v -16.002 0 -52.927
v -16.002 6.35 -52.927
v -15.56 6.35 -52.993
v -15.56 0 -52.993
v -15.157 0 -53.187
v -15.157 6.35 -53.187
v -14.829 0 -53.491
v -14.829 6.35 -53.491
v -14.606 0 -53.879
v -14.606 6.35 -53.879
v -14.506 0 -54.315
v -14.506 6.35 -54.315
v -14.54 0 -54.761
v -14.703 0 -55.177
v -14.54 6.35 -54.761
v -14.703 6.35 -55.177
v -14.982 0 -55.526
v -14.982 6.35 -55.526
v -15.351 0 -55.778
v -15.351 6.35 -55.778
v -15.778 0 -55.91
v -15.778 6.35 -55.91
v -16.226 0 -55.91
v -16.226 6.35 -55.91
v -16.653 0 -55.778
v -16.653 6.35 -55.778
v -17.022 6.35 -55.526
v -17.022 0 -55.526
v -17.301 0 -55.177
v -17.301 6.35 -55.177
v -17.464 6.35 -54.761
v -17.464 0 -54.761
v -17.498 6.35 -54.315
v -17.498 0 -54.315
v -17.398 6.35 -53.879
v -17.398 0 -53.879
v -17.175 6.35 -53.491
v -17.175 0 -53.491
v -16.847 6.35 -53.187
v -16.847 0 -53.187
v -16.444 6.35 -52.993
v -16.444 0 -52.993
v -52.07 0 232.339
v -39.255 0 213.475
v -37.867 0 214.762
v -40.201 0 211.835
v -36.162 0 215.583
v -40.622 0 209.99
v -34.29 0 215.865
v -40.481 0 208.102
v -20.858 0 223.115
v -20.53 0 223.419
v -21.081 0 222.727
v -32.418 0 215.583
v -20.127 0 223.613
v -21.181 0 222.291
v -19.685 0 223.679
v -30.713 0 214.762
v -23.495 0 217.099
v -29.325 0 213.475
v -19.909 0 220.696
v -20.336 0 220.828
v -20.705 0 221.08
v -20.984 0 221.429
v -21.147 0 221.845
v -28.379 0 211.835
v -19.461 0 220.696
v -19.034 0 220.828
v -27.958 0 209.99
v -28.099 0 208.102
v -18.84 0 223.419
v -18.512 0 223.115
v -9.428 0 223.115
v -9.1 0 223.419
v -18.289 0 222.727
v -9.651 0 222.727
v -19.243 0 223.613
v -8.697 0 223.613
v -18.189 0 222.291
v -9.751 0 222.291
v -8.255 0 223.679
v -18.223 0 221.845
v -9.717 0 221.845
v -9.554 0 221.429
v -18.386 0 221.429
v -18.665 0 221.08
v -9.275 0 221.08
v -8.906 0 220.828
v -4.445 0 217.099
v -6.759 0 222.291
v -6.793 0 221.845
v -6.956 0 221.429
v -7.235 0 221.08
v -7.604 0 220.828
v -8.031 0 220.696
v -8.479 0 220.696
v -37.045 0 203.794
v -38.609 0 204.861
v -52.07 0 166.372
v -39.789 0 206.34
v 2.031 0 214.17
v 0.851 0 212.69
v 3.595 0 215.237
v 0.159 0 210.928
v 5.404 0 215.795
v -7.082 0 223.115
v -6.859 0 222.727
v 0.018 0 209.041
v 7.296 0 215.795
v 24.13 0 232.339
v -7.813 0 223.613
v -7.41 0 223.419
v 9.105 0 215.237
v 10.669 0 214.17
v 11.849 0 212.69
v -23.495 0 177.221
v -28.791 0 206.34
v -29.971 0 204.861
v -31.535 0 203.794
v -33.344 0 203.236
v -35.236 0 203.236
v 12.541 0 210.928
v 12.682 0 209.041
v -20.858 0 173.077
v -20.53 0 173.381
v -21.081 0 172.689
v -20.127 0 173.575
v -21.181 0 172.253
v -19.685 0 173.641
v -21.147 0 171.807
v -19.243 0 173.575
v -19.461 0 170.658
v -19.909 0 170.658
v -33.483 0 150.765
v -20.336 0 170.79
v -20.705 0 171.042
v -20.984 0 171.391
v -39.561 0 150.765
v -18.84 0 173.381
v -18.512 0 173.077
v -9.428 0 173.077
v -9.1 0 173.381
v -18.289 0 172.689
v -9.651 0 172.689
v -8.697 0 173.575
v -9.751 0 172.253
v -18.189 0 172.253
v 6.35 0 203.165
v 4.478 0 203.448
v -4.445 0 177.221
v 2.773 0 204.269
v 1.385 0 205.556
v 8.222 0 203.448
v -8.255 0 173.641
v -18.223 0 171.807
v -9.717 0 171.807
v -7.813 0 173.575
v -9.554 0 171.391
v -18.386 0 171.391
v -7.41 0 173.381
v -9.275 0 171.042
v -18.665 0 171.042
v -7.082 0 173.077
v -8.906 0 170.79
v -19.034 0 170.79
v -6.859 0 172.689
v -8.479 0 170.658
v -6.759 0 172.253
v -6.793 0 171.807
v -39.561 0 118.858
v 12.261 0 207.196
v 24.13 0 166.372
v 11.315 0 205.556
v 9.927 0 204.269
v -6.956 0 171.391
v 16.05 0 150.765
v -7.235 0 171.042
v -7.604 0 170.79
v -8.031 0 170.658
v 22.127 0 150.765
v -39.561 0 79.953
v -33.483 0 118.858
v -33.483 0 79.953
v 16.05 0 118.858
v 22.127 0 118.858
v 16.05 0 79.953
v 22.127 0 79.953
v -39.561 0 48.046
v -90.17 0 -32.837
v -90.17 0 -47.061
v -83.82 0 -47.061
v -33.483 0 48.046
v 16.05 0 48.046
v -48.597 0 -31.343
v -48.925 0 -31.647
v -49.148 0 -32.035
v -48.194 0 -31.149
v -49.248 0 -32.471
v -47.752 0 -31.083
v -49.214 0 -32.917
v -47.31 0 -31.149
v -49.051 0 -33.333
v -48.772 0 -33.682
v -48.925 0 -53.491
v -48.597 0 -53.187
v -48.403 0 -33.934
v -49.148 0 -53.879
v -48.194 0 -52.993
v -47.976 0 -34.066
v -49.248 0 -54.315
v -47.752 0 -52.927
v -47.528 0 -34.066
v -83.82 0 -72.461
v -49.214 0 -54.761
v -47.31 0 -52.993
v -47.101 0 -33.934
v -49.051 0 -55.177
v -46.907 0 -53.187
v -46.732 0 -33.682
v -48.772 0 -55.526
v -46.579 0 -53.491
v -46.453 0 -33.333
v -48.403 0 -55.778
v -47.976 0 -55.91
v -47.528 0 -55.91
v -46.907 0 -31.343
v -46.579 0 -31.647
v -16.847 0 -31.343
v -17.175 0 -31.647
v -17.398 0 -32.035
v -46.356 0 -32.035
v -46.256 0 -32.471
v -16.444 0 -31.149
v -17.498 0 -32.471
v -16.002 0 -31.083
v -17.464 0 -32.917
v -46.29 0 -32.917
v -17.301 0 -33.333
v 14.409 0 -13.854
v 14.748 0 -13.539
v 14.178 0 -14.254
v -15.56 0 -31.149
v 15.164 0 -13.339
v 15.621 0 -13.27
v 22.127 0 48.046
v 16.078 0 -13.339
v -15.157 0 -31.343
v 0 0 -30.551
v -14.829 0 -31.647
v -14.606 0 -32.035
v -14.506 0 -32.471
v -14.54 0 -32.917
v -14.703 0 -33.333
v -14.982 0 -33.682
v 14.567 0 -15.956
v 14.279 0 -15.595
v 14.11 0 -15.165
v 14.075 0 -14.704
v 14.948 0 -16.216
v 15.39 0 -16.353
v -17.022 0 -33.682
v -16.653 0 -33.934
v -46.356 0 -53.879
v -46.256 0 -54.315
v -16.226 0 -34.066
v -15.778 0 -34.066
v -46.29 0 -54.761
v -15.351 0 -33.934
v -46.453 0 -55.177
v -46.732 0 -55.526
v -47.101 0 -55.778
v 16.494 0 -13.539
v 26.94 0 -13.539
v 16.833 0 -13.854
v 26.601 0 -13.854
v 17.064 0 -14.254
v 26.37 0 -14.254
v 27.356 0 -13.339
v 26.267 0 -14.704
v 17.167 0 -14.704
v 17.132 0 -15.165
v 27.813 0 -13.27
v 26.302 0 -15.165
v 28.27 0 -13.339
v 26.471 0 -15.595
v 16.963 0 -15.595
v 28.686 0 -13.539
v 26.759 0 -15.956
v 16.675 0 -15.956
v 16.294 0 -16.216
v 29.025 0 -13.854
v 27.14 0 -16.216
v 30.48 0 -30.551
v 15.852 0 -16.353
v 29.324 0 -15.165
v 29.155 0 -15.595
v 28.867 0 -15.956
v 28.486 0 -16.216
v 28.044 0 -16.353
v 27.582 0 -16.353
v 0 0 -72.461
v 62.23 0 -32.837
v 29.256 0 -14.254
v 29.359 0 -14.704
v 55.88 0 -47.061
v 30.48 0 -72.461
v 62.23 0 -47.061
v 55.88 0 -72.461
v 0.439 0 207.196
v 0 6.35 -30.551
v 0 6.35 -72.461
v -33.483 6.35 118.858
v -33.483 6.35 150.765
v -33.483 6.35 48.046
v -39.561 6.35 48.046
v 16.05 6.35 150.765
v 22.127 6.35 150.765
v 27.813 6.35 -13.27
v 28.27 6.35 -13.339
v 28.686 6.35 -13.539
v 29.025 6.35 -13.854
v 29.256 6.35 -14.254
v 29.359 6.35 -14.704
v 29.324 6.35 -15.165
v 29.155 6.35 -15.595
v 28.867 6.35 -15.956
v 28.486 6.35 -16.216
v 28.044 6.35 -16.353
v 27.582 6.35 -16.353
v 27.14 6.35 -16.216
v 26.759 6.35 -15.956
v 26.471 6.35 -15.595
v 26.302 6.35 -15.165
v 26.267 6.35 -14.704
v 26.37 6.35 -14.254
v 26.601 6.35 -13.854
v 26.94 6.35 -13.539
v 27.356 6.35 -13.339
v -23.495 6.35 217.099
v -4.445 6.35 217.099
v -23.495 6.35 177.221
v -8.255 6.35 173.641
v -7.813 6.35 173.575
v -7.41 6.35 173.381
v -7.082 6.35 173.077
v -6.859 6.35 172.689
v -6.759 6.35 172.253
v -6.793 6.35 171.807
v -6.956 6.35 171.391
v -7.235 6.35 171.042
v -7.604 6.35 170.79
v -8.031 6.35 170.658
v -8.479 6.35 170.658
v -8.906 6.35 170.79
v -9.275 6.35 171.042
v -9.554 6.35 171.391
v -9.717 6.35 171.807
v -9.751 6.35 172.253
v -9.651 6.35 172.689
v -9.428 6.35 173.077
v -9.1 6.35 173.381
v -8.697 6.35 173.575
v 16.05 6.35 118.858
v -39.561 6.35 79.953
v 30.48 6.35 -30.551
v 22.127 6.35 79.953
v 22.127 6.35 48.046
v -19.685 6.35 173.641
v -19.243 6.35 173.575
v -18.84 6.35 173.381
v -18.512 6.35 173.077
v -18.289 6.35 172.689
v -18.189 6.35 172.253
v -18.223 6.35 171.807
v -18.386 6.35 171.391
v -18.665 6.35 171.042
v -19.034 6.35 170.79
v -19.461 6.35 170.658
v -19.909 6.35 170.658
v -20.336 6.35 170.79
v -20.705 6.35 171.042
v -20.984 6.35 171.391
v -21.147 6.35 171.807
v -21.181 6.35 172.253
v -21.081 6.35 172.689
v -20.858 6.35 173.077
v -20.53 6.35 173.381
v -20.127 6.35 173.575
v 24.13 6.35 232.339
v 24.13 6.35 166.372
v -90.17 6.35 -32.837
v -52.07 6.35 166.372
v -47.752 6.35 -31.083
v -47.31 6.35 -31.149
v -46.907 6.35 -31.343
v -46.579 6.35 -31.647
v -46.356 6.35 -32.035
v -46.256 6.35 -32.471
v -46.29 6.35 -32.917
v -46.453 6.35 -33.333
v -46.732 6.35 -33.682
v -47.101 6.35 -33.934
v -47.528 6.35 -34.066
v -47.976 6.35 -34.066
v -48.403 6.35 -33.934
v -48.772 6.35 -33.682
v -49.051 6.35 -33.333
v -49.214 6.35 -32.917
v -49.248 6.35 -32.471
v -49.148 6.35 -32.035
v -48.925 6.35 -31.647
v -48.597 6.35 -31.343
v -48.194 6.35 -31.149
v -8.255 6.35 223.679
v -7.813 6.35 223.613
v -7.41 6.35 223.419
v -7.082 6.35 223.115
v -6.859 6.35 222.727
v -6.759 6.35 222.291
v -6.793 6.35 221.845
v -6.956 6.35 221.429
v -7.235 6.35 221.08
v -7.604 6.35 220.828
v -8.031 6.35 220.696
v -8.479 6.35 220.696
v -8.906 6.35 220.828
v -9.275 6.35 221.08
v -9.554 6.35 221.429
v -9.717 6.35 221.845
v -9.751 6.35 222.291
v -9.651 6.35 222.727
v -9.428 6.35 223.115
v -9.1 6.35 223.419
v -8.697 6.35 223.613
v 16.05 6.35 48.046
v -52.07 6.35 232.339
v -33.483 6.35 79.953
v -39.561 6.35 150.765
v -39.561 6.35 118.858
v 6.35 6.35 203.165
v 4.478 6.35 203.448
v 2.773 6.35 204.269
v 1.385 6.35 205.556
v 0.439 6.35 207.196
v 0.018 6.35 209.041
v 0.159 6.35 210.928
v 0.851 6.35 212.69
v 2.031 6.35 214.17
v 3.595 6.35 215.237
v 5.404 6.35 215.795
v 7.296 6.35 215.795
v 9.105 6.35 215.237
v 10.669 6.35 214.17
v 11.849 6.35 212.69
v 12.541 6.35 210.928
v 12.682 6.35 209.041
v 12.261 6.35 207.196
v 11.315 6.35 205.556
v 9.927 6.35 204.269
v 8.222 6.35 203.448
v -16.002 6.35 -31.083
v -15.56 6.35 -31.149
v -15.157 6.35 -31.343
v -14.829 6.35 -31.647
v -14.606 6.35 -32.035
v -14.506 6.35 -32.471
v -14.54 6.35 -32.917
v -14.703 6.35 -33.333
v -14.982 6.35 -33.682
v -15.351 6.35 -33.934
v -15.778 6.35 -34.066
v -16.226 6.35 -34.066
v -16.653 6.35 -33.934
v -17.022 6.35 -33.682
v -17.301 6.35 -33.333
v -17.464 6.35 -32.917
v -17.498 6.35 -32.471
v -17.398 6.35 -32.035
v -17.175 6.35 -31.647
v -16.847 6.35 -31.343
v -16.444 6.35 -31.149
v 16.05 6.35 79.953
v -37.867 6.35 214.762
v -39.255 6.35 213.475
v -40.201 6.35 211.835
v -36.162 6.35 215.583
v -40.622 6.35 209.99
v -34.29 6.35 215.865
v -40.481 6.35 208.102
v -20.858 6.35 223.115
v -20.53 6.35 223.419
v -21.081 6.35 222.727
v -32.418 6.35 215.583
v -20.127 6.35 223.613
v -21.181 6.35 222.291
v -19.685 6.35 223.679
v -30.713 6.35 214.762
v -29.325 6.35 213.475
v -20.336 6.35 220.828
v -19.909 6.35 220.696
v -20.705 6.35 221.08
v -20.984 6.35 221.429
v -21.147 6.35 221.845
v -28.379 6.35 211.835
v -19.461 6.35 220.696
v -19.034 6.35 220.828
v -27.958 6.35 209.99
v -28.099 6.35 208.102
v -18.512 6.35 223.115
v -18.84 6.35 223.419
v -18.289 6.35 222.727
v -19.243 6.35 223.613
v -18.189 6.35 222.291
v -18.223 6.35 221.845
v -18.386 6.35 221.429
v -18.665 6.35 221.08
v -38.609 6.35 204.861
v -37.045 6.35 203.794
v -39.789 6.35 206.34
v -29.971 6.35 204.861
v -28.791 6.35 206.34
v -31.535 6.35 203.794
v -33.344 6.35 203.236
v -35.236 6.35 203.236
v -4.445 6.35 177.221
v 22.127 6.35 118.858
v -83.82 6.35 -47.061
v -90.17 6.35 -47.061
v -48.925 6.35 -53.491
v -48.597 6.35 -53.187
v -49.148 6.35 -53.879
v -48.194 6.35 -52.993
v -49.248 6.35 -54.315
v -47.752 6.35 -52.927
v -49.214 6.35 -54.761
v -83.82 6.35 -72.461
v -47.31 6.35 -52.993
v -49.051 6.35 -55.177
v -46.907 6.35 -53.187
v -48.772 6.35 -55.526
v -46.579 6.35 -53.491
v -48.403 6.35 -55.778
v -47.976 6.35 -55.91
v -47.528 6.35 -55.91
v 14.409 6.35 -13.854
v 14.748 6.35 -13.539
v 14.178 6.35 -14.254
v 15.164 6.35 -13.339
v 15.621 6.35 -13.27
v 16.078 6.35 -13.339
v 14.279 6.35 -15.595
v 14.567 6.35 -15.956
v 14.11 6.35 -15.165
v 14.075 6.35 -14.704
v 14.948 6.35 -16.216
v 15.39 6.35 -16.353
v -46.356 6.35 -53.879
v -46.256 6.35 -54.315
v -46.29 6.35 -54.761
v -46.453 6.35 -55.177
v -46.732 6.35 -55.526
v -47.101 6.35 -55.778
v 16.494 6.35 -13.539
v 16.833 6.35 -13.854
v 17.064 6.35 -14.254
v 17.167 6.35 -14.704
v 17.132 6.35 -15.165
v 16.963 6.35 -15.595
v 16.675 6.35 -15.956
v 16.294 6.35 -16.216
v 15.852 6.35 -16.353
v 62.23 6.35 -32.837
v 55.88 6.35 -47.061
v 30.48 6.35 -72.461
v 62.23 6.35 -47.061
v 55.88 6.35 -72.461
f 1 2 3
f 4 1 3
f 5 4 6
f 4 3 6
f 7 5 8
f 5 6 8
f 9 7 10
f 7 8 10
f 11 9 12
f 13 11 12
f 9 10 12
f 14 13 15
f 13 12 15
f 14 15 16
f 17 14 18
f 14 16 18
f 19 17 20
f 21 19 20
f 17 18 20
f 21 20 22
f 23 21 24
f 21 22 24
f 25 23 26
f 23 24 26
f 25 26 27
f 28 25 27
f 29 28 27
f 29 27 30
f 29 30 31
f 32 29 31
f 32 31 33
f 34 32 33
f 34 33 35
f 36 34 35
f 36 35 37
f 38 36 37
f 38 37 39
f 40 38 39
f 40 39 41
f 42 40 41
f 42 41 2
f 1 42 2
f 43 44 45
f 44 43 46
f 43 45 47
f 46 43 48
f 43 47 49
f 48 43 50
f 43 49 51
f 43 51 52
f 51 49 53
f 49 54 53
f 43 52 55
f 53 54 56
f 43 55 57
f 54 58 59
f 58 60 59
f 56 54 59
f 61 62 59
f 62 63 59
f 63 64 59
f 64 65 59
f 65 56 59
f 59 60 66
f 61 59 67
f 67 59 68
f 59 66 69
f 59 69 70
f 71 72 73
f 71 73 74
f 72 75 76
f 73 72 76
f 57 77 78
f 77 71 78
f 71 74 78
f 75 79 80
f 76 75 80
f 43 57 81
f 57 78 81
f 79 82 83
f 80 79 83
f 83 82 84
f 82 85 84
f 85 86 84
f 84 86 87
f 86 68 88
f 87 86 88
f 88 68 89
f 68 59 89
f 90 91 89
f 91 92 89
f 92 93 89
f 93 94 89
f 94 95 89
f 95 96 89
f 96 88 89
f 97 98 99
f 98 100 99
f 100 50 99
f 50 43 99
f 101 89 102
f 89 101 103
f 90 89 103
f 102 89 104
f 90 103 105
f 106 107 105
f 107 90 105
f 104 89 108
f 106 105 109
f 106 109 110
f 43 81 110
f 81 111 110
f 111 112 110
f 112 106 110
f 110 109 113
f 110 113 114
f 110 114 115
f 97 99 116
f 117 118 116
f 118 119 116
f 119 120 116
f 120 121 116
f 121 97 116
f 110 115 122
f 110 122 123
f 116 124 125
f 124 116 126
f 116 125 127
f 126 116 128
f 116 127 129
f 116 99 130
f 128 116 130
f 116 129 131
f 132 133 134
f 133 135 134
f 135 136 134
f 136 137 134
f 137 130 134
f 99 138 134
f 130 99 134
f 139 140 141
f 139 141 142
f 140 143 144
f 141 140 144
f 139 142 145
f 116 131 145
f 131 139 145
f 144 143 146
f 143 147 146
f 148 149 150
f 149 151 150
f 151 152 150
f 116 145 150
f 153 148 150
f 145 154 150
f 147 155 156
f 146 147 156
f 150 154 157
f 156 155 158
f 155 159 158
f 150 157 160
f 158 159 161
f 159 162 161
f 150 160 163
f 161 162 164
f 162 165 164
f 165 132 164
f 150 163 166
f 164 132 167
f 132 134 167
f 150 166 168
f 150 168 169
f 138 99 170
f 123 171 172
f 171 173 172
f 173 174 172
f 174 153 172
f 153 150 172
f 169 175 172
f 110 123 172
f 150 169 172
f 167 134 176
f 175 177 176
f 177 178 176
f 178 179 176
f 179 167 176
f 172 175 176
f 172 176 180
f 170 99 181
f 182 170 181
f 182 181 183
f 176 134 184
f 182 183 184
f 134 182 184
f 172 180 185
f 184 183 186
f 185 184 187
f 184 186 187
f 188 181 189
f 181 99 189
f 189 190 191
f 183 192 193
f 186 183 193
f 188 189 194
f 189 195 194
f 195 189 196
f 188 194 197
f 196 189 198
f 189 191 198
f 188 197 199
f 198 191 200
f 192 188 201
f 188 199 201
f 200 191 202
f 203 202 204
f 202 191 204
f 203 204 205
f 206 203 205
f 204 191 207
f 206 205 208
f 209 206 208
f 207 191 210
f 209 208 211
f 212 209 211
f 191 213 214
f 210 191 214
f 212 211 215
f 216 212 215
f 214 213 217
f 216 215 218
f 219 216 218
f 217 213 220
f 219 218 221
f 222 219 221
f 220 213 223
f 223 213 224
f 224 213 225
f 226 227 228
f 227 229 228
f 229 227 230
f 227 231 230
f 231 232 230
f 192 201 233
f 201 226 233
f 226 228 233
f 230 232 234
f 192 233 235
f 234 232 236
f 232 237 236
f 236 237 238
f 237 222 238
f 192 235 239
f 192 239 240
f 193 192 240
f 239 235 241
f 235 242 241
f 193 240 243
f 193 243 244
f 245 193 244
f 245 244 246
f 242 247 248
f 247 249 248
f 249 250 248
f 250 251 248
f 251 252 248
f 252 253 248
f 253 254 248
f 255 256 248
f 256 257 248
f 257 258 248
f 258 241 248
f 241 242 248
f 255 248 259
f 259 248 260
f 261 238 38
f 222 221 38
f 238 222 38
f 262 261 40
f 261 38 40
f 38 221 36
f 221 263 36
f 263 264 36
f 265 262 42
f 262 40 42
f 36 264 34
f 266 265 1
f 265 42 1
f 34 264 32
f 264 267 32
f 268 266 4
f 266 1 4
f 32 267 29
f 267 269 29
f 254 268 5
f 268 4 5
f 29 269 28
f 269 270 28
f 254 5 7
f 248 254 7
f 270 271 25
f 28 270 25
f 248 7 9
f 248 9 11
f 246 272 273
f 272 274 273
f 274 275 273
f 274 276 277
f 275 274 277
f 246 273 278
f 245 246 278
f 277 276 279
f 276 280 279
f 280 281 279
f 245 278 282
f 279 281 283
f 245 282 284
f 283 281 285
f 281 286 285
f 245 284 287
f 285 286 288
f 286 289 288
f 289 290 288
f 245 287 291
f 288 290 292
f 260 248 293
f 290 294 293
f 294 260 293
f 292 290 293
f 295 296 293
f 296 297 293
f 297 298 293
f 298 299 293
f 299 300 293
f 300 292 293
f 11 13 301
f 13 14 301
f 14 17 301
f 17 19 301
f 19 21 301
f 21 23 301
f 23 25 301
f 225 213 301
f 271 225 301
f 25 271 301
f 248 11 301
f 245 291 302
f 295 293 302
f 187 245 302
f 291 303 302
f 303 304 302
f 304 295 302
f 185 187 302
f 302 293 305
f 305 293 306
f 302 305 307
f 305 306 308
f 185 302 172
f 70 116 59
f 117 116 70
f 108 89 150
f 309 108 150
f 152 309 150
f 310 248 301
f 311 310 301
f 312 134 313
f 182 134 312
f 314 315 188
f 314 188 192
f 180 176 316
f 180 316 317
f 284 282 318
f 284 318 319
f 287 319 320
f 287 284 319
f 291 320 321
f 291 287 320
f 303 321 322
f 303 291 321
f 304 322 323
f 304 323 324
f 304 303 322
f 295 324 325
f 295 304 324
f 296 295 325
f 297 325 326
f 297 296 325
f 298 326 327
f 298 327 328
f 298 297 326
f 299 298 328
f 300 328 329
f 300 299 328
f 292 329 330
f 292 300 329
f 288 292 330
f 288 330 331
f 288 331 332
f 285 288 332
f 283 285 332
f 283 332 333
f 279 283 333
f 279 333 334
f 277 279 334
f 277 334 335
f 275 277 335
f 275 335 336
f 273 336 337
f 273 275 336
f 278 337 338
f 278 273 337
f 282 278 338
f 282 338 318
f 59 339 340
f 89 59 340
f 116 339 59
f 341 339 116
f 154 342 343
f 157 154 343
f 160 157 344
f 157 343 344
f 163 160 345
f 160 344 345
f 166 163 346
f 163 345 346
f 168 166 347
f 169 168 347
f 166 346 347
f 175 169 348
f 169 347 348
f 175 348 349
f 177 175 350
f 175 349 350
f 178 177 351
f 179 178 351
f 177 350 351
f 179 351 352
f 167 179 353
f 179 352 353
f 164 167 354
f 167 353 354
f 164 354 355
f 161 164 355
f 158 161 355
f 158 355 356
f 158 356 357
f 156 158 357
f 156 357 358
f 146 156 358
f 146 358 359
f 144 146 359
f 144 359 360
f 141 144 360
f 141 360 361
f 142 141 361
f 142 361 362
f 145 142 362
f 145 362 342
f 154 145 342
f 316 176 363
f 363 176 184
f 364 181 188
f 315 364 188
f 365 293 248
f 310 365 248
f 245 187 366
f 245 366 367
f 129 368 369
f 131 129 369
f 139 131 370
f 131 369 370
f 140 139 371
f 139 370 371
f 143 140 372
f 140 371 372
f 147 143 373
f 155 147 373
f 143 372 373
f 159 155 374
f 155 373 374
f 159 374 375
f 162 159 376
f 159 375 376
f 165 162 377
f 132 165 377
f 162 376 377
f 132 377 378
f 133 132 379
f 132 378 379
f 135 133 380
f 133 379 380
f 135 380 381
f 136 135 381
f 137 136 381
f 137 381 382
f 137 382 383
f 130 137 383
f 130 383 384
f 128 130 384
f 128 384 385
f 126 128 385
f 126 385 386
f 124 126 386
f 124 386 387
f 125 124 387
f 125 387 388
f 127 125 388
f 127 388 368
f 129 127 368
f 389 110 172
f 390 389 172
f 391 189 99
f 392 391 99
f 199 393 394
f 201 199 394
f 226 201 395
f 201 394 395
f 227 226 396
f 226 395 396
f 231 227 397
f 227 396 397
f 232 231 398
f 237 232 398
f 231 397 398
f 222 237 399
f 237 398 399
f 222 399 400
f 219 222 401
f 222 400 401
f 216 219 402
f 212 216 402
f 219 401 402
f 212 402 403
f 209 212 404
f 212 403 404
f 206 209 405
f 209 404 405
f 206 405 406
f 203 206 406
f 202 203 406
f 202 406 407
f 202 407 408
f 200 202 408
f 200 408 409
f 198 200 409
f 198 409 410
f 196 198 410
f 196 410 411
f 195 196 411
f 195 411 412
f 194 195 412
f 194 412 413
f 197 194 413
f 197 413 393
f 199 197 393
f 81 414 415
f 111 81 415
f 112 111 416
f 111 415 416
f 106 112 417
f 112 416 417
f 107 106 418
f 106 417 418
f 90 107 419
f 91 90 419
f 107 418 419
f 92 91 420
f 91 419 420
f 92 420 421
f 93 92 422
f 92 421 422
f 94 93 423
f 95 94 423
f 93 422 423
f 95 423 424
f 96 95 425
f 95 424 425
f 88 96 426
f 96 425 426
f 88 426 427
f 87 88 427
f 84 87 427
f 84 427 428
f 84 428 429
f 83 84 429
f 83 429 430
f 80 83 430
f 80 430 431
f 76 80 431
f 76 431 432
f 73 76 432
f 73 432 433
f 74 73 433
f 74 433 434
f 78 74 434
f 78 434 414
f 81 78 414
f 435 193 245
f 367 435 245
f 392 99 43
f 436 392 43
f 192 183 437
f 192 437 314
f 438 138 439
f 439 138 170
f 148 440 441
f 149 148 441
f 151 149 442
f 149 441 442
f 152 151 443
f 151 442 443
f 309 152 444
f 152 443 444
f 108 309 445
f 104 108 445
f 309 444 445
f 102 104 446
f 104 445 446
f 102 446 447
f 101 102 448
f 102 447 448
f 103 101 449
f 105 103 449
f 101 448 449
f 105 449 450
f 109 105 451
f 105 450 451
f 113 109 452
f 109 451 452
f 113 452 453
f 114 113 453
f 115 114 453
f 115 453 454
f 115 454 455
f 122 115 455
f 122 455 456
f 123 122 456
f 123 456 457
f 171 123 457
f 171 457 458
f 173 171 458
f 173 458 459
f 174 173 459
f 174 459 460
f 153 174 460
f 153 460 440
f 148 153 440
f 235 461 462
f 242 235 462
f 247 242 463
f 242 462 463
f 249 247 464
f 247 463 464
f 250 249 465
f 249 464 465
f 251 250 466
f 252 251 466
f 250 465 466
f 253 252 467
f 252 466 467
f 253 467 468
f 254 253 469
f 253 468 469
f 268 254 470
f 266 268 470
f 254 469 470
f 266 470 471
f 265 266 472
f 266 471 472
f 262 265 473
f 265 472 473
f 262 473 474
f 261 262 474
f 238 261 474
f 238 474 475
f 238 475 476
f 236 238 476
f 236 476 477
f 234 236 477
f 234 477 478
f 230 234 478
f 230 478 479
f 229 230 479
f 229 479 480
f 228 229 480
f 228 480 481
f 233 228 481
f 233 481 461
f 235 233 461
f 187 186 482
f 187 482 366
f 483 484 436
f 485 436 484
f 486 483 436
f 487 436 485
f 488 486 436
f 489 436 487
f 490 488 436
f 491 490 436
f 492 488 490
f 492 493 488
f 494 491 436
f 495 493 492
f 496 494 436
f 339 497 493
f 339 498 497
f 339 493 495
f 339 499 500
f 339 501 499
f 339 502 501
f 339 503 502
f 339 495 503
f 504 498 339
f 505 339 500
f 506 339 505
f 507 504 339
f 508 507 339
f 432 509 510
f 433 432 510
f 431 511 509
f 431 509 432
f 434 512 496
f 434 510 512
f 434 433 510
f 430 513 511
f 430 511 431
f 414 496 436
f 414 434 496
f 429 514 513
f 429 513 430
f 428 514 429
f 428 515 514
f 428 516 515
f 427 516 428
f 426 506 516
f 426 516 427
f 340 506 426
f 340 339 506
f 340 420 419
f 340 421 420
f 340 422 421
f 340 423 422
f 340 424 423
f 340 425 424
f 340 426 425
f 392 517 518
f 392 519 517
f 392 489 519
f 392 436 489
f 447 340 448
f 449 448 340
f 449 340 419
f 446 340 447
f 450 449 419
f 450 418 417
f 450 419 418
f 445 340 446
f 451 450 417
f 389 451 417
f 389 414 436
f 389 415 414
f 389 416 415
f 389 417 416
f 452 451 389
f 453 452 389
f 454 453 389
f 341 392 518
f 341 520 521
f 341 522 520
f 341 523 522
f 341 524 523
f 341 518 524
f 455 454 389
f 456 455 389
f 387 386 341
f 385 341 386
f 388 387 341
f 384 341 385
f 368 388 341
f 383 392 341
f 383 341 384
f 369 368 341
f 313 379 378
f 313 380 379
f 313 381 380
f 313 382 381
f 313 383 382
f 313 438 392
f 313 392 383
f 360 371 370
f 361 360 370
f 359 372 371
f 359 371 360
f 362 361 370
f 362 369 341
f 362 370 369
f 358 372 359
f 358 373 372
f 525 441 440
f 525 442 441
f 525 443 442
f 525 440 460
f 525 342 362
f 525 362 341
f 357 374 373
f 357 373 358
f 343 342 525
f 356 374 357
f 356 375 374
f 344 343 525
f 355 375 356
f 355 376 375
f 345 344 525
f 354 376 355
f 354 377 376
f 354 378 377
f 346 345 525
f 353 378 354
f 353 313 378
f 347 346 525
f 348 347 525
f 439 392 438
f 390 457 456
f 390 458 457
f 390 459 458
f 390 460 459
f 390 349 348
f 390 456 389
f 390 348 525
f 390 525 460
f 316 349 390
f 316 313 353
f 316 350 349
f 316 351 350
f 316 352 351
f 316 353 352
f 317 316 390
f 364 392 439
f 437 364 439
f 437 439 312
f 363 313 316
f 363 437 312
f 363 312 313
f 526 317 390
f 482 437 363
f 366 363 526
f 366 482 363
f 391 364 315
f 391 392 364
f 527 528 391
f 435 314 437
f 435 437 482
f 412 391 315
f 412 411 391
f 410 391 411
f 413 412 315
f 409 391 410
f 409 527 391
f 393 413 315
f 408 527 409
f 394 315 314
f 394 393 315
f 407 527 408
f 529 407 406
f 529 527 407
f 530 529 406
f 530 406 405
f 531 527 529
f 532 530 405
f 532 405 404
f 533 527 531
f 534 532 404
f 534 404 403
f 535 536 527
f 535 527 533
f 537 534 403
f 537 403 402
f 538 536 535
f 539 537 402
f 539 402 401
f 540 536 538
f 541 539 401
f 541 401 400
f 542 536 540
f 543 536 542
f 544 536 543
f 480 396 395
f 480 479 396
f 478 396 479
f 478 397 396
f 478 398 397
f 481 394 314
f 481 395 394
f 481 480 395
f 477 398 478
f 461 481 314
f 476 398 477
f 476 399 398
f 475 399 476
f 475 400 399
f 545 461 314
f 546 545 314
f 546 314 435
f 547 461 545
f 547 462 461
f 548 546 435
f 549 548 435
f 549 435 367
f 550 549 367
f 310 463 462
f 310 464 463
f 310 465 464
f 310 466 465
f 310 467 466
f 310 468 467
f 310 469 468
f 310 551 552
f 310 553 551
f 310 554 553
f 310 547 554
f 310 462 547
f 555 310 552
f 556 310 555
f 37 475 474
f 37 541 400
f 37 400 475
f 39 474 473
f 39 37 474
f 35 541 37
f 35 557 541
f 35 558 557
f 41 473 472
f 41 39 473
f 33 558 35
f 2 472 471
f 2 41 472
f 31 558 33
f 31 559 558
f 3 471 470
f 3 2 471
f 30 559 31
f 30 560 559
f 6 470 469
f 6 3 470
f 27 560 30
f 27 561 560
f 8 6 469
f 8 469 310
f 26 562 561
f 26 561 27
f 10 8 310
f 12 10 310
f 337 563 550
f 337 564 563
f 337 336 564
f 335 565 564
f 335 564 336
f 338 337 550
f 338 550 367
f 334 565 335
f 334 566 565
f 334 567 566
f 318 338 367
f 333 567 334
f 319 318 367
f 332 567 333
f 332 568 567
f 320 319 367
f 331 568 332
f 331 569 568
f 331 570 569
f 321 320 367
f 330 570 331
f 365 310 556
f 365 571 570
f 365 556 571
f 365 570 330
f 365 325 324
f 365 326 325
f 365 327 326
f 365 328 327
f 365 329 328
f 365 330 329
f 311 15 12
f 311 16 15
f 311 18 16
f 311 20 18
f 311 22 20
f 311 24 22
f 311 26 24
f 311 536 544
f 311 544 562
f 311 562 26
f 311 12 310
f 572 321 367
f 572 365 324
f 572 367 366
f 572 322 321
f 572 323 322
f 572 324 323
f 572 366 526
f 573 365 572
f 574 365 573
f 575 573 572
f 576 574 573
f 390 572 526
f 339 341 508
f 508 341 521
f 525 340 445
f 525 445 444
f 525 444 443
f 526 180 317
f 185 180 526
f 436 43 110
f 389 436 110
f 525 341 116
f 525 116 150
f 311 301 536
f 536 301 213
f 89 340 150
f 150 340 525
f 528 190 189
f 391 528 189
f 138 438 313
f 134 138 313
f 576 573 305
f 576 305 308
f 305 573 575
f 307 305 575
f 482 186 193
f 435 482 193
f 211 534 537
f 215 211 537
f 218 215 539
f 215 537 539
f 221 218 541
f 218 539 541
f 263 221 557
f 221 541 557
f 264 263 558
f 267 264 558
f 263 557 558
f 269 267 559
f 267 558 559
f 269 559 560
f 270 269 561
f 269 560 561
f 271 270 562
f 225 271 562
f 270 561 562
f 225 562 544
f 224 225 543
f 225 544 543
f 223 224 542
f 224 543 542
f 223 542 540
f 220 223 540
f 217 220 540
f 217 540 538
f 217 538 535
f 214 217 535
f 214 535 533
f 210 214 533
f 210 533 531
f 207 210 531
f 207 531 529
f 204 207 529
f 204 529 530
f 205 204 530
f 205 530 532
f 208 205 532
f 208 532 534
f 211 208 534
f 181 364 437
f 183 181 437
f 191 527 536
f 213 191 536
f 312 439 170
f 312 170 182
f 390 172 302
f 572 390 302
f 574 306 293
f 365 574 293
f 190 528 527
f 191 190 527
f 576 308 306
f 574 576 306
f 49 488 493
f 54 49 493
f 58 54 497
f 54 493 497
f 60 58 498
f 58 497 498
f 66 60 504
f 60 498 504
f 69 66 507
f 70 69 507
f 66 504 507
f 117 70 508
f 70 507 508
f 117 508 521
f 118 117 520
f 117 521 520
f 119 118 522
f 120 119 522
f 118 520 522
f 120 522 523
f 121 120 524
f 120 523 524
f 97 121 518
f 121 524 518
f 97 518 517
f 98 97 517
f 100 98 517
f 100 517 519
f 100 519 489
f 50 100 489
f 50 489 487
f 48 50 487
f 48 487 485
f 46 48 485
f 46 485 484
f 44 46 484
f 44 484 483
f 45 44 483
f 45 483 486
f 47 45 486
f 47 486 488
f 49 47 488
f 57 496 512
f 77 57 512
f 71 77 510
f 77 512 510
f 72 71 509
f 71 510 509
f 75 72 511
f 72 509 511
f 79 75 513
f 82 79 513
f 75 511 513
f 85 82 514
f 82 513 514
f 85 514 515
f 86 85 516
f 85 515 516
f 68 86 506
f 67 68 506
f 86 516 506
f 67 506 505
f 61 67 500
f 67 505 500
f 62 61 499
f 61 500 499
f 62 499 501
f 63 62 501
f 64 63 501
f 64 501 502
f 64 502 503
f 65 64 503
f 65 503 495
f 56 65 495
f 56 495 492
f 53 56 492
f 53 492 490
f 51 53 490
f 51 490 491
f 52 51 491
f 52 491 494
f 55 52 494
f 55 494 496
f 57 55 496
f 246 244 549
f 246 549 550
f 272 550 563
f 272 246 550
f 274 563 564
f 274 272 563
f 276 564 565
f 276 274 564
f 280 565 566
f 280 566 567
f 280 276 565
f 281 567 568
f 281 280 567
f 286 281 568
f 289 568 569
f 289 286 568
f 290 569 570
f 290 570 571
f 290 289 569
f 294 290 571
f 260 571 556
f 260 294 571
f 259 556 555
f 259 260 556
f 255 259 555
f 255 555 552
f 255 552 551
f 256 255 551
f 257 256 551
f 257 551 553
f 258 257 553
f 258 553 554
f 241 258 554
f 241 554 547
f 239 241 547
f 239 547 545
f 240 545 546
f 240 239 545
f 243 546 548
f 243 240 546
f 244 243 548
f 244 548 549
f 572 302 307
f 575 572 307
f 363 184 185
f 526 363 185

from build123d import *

# Parameters (mm, degrees)
SKETCH1_R           = 1.55
BOSS_EXTRUDE1_DEPTH = 6.35
SKETCH4_R           = 6.35
SKETCH4_W           = 6.35
SKETCH4_H           = 25.4
CUT_EXTRUDE2_DEPTH  = 250.304006214
SKETCH5_R           = 1.5
SKETCH5_W           = 19.05
SKETCH5_H           = 39.878
CUT_EXTRUDE3_DEPTH  = 250.304006214
SKETCH9_W           = 6.077459071
SKETCH9_H           = 31.906291655
SKETCH9_H_2         = 31.906291656
CUT_EXTRUDE4_DEPTH  = 37.338


with BuildPart() as part:
    # Sketch1 → Boss-Extrude1 (new body)
    with BuildSketch(Plane(origin=(0, 0, 0), x_dir=(1, 0, 0), z_dir=(0, 1, 0))):
        Polygon((-90.17, 72.46073058), (-90.17, 32.83673058), (-52.07, -166.371605632), (-52.07, -232.33926942), (24.13, -232.33926942), (24.13, -166.371605632), (62.23, 32.83673058), (62.23, 72.46073058), (30.48, 72.46073058), (30.48, 30.55073058), (0, 30.55073058), (0, 72.46073058), align=None)
        with Locations(Location((15.621, 14.819934213, 0), (0, 0, 270))):
            Circle(SKETCH1_R, mode=Mode.SUBTRACT)
        with Locations(Location((27.813, 14.819934213, 0), (0, 0, 270))):
            Circle(SKETCH1_R, mode=Mode.SUBTRACT)
    extrude(amount=BOSS_EXTRUDE1_DEPTH)

    # Sketch4 → Cut-Extrude2 (cut, through all)
    with BuildSketch(Plane(origin=(0, 6.35, 0), x_dir=(1, 0, 0), z_dir=(0, 1, 0))):
        with Locations(Location((-34.29, -209.515437526, 0), (0, 0, 270))):
            Circle(SKETCH4_R)
        with Locations(Location((6.35, -209.515437526, 0), (0, 0, 90))):
            Circle(SKETCH4_R)
        with Locations((59.055, 59.76073058)):
            Rectangle(SKETCH4_W, SKETCH4_H)
        with Locations((-86.995, 59.76073058)):
            Rectangle(SKETCH4_W, SKETCH4_H)
    extrude(amount=-CUT_EXTRUDE2_DEPTH, mode=Mode.SUBTRACT)

    # Sketch5 → Cut-Extrude3 (cut, through all)
    with BuildSketch(Plane(origin=(0, 6.35, 0), x_dir=(1, 0, 0), z_dir=(0, 1, 0))):
        with Locations(Location((-19.685, -222.17926942, 0), (0, 0, 270))):
            Circle(SKETCH5_R)
        with Locations(Location((-8.255, -222.17926942, 0), (0, 0, 270))):
            Circle(SKETCH5_R)
        with Locations(Location((-19.685, -172.14126942, 0), (0, 0, 270))):
            Circle(SKETCH5_R)
        with Locations(Location((-8.255, -172.14126942, 0), (0, 0, 270))):
            Circle(SKETCH5_R)
        with Locations(Location((-16.002, 54.42673058, 0), (0, 0, 270))):
            Circle(SKETCH5_R)
        with Locations(Location((-47.752, 54.42673058, 0), (0, 0, 270))):
            Circle(SKETCH5_R)
        with Locations(Location((-47.752, 32.58273058, 0), (0, 0, 270))):
            Circle(SKETCH5_R)
        with Locations(Location((-16.002, 32.58273058, 0), (0, 0, 270))):
            Circle(SKETCH5_R)
        with Locations((-13.97, -197.16026942)):
            Rectangle(SKETCH5_W, SKETCH5_H)
    extrude(amount=-CUT_EXTRUDE3_DEPTH, mode=Mode.SUBTRACT)

    # Sketch9 → Cut-Extrude4 (cut)
    with BuildSketch(Plane(origin=(0, 0, 0), x_dir=(1, 0, 0), z_dir=(0, 1, 0))):
        with Locations((19.088272024, -134.811490569)):
            Rectangle(SKETCH9_W, SKETCH9_H)
        with Locations((19.088272024, -63.999553047)):
            Rectangle(SKETCH9_W, SKETCH9_H_2)
        with Locations((-36.522018281, -134.811490569)):
            Rectangle(SKETCH9_W, SKETCH9_H)
        with Locations((-36.522018281, -63.999553047)):
            Rectangle(SKETCH9_W, SKETCH9_H_2)
    extrude(amount=CUT_EXTRUDE4_DEPTH, mode=Mode.SUBTRACT)


solid = part.part
